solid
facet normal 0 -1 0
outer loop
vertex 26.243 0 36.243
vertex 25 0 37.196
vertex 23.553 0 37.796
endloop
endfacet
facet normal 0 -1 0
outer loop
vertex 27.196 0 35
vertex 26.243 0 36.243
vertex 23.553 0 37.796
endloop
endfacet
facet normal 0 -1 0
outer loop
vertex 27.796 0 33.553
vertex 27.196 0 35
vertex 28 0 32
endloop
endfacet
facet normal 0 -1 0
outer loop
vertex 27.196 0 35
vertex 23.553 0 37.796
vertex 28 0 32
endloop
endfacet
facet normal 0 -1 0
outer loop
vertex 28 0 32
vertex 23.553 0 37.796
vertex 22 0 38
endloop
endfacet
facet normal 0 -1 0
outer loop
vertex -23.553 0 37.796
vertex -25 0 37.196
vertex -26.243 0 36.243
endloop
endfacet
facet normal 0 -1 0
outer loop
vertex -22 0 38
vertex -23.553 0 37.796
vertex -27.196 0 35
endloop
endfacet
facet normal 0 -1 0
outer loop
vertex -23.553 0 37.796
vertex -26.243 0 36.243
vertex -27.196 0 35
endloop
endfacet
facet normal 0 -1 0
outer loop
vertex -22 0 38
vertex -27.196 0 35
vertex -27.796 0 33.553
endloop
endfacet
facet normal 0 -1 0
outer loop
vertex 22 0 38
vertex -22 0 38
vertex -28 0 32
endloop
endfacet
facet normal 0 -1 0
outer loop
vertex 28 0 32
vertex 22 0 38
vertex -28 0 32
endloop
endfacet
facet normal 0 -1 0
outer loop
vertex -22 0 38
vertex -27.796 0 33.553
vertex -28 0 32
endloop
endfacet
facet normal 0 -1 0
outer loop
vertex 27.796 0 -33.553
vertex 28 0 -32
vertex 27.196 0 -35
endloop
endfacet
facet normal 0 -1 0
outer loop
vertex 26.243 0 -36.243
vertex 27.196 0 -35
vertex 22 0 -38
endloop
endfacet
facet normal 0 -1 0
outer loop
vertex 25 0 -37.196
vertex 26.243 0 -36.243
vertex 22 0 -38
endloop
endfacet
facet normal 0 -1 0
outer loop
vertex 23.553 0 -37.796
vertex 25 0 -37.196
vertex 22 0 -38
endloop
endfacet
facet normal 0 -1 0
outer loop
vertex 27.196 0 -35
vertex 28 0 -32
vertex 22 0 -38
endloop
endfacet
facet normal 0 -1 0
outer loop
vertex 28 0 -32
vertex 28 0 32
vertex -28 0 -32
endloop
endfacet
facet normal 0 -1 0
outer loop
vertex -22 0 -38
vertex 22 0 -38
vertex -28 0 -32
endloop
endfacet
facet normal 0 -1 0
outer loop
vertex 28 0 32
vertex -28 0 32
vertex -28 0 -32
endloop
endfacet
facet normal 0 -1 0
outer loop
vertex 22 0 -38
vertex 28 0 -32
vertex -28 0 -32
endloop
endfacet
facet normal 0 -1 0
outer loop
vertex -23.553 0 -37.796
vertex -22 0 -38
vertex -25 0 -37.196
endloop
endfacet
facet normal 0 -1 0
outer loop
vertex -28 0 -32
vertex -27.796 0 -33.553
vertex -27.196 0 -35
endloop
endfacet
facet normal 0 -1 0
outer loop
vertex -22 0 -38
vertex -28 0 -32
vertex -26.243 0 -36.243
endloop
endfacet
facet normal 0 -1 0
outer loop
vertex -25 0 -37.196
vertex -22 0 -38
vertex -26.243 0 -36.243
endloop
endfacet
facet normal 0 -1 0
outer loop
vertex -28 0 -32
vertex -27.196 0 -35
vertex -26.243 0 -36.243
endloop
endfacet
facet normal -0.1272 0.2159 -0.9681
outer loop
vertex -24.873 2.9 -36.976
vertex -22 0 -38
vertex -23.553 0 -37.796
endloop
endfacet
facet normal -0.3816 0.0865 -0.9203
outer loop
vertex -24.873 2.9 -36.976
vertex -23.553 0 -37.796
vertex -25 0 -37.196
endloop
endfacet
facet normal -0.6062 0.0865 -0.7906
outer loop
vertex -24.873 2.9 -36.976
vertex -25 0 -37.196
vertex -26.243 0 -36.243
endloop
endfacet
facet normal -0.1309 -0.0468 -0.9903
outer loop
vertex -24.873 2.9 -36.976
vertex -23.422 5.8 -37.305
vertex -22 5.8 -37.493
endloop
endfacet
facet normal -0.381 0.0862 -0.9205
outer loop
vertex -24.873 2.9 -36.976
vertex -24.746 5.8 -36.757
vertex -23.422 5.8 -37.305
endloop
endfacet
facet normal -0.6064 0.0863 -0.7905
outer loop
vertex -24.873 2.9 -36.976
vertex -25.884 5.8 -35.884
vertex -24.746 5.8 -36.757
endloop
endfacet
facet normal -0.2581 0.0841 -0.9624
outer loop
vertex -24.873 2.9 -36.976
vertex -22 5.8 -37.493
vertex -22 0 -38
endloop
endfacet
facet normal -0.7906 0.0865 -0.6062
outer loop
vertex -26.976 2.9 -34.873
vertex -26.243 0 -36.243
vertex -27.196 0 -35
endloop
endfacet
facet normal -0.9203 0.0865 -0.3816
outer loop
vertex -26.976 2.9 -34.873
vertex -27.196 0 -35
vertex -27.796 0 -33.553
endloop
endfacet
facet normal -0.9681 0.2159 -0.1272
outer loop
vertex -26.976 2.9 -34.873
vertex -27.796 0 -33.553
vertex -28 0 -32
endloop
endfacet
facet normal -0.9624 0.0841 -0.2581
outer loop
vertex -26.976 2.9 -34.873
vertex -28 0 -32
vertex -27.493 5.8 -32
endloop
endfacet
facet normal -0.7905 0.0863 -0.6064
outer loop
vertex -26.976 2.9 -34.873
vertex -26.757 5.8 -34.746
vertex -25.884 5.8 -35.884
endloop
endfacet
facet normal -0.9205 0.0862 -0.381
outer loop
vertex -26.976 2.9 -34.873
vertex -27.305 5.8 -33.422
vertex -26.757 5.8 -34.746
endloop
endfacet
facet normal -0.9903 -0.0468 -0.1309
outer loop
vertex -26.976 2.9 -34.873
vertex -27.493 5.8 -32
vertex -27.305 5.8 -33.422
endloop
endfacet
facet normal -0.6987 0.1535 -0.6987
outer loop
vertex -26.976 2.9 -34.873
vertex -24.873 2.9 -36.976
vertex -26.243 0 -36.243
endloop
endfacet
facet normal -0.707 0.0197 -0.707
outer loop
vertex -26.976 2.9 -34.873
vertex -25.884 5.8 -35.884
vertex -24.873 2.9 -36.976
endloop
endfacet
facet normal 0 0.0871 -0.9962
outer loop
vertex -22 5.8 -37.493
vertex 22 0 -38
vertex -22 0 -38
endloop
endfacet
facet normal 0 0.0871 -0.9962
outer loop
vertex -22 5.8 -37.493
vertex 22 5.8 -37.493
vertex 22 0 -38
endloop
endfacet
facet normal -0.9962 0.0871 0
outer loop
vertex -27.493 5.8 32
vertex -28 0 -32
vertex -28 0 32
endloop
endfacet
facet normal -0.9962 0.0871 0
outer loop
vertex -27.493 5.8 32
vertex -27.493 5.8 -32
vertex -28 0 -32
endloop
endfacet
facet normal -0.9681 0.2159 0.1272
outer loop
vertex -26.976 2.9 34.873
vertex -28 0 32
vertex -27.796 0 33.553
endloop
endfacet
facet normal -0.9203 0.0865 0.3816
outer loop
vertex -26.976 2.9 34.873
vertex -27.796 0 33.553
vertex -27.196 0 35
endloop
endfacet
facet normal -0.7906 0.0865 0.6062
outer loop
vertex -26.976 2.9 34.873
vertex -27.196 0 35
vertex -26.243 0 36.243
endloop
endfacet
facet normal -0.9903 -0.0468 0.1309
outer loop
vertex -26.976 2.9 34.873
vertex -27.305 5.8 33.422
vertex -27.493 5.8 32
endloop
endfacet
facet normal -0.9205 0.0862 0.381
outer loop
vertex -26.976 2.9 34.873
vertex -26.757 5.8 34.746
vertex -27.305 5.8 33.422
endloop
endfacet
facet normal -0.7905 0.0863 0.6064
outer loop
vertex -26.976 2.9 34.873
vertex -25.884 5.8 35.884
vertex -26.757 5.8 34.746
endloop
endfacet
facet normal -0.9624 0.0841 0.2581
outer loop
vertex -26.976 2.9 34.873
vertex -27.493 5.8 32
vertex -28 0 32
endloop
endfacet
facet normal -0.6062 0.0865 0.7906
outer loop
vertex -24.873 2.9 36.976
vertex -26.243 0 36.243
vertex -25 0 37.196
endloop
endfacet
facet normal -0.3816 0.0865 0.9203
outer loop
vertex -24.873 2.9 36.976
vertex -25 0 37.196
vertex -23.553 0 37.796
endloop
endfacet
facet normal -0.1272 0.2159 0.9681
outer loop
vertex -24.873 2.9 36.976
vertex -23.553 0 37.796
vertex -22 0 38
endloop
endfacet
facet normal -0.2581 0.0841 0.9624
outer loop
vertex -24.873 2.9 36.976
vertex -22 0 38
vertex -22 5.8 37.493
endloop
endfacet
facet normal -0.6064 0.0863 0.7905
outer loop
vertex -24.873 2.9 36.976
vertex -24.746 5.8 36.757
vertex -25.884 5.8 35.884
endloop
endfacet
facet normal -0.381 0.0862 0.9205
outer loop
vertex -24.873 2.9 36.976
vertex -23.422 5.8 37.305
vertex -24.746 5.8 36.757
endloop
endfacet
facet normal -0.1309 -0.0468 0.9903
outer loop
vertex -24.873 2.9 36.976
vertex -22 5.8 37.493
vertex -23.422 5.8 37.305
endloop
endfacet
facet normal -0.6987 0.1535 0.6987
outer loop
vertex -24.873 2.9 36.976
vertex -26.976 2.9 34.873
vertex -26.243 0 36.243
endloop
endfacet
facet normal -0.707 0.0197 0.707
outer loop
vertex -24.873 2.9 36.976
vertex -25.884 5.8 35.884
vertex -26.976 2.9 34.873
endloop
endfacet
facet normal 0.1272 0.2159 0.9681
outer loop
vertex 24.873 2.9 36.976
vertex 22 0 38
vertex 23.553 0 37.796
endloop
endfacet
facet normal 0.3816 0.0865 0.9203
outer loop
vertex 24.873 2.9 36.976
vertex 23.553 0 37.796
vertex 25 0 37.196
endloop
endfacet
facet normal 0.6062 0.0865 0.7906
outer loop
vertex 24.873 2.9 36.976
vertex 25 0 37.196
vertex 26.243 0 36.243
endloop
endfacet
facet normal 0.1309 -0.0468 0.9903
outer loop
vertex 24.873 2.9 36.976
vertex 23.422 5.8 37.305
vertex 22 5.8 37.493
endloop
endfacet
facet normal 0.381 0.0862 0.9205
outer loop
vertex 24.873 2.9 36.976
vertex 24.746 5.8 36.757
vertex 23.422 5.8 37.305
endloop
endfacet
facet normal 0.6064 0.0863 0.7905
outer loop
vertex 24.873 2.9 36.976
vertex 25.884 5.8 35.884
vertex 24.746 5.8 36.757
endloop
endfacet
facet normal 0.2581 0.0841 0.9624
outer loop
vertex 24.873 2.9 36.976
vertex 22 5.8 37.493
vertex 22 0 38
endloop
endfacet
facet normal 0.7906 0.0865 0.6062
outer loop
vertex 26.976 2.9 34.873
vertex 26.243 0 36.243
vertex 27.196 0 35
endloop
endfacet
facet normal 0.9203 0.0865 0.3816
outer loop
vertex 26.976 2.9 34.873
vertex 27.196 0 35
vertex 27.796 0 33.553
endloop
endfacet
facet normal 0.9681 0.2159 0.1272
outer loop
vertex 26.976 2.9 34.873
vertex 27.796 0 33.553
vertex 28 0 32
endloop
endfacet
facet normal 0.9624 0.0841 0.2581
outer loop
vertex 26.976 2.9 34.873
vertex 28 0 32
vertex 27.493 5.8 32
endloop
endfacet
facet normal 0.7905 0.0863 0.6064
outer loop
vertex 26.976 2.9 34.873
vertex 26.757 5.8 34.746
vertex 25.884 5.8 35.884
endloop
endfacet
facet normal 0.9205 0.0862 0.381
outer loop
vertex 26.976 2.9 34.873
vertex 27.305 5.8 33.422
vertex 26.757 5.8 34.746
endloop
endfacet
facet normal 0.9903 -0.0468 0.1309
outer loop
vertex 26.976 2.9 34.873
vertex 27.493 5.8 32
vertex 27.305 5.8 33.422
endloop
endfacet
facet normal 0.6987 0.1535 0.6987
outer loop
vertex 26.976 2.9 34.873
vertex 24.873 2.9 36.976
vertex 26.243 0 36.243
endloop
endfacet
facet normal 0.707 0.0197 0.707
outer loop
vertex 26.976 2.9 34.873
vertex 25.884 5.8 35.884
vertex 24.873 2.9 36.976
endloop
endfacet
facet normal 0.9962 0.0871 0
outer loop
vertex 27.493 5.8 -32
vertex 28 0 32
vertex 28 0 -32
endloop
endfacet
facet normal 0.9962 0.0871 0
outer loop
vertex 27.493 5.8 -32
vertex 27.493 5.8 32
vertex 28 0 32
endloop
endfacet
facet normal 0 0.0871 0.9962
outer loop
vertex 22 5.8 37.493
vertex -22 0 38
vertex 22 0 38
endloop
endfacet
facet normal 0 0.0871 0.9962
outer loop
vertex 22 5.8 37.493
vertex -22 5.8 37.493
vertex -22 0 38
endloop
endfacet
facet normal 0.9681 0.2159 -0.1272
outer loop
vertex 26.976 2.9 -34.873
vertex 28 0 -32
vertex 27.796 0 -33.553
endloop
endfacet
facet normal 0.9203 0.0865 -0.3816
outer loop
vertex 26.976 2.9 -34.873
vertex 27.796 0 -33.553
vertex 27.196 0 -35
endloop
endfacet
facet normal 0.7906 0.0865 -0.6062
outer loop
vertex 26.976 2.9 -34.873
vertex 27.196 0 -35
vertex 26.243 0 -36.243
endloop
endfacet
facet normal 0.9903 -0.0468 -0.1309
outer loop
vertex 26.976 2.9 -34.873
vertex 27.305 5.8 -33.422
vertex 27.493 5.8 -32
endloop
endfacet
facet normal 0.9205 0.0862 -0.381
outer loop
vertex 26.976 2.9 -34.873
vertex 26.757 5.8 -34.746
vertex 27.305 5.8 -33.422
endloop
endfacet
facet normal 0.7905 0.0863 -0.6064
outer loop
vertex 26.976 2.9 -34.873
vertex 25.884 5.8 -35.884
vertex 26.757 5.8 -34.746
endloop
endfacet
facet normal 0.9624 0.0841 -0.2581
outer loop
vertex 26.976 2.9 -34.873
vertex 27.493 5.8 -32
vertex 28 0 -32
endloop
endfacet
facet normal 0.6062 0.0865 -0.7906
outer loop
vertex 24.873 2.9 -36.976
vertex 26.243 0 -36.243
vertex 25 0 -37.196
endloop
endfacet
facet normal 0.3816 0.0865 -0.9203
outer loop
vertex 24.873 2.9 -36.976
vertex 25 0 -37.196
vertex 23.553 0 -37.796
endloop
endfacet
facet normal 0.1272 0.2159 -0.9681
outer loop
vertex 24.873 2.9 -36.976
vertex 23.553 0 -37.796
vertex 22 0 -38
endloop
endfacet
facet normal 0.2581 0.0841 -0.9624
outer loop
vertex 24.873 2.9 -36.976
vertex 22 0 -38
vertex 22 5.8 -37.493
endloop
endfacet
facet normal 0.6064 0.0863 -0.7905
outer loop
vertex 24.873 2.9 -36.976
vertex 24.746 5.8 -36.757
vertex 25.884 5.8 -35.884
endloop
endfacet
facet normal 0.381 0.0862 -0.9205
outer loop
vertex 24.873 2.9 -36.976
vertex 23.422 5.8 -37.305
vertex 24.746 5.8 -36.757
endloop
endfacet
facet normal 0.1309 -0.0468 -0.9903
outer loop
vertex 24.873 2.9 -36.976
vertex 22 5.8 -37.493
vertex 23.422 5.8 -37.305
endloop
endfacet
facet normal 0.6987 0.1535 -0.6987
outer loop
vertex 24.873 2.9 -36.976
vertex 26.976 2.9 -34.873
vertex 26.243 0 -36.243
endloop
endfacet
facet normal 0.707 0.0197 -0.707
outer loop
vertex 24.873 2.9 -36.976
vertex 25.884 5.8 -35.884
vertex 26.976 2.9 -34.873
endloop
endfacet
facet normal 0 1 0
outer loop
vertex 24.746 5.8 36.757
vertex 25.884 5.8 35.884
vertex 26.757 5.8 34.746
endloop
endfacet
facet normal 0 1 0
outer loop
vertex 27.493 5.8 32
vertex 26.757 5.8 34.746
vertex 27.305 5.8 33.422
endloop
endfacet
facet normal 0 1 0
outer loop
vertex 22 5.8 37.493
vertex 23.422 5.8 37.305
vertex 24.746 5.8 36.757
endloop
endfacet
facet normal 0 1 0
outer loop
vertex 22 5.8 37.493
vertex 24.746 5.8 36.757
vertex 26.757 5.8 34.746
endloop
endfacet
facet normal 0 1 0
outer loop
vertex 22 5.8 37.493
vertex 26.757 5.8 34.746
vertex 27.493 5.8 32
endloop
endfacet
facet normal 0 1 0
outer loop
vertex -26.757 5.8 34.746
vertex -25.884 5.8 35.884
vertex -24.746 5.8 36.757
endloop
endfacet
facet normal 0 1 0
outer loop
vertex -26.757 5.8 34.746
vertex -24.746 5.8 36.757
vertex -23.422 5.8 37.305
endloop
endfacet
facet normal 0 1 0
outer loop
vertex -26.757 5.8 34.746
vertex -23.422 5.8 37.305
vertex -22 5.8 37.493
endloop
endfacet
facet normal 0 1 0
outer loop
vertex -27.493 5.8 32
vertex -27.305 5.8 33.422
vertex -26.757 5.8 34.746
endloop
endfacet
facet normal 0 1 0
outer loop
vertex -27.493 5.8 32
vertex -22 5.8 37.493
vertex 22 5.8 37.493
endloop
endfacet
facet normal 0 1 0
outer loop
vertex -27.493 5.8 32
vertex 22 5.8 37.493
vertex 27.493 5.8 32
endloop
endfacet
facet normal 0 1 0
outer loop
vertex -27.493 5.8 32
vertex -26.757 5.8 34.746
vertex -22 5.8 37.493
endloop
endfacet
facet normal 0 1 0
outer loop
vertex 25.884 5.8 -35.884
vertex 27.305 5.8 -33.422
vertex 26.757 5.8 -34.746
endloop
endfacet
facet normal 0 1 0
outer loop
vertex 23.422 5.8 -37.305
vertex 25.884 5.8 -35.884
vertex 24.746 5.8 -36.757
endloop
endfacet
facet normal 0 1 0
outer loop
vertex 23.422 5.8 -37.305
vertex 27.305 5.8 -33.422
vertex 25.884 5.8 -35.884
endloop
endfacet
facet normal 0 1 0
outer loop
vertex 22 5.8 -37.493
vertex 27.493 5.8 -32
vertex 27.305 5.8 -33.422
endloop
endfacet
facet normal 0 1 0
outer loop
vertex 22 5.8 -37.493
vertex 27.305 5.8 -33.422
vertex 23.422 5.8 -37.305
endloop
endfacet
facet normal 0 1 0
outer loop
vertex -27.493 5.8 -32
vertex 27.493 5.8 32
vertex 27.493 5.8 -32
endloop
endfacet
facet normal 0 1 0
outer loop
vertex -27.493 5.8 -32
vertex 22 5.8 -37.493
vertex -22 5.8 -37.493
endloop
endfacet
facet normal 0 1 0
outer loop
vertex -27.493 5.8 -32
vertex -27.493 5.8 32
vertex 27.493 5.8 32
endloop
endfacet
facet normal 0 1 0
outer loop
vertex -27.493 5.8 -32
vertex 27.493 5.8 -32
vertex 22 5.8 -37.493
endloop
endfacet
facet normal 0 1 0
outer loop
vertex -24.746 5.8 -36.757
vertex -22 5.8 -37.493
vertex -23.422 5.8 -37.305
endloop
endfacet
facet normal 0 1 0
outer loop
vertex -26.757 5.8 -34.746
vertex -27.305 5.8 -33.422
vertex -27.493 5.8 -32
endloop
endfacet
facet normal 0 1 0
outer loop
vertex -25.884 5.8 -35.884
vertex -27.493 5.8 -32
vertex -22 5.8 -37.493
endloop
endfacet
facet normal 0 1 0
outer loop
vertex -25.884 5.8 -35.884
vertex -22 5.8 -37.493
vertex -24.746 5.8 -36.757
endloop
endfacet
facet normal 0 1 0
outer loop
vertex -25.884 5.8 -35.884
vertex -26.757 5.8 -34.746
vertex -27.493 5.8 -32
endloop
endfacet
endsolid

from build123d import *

# Parameters (mm, degrees)
BOSS_EXTRUDE2_DEPTH = 5.8
BOSS_EXTRUDE2_TAPER = 5


with BuildPart() as part:
    # Sketch3 → Boss-Extrude2 (new body)
    with BuildSketch(Plane(origin=(0, 0, 0), x_dir=(1, 0, 0), z_dir=(0, 1, 0))):
        with BuildLine():
            ThreePointArc((-22, 38), (-26.242640687, 36.242640687), (-28, 32))
            Line((-28, 32), (-28, -32))
            ThreePointArc((-28, -32), (-26.242640687, -36.242640687), (-22, -38))
            Line((-22, -38), (22, -38))
            ThreePointArc((22, -38), (26.242640687, -36.242640687), (28, -32))
            Line((28, -32), (28, 32))
            ThreePointArc((28, 32), (26.242640687, 36.242640687), (22, 38))
            Line((22, 38), (-22, 38))
        make_face()
    extrude(amount=BOSS_EXTRUDE2_DEPTH, taper=BOSS_EXTRUDE2_TAPER)


solid = part.part
